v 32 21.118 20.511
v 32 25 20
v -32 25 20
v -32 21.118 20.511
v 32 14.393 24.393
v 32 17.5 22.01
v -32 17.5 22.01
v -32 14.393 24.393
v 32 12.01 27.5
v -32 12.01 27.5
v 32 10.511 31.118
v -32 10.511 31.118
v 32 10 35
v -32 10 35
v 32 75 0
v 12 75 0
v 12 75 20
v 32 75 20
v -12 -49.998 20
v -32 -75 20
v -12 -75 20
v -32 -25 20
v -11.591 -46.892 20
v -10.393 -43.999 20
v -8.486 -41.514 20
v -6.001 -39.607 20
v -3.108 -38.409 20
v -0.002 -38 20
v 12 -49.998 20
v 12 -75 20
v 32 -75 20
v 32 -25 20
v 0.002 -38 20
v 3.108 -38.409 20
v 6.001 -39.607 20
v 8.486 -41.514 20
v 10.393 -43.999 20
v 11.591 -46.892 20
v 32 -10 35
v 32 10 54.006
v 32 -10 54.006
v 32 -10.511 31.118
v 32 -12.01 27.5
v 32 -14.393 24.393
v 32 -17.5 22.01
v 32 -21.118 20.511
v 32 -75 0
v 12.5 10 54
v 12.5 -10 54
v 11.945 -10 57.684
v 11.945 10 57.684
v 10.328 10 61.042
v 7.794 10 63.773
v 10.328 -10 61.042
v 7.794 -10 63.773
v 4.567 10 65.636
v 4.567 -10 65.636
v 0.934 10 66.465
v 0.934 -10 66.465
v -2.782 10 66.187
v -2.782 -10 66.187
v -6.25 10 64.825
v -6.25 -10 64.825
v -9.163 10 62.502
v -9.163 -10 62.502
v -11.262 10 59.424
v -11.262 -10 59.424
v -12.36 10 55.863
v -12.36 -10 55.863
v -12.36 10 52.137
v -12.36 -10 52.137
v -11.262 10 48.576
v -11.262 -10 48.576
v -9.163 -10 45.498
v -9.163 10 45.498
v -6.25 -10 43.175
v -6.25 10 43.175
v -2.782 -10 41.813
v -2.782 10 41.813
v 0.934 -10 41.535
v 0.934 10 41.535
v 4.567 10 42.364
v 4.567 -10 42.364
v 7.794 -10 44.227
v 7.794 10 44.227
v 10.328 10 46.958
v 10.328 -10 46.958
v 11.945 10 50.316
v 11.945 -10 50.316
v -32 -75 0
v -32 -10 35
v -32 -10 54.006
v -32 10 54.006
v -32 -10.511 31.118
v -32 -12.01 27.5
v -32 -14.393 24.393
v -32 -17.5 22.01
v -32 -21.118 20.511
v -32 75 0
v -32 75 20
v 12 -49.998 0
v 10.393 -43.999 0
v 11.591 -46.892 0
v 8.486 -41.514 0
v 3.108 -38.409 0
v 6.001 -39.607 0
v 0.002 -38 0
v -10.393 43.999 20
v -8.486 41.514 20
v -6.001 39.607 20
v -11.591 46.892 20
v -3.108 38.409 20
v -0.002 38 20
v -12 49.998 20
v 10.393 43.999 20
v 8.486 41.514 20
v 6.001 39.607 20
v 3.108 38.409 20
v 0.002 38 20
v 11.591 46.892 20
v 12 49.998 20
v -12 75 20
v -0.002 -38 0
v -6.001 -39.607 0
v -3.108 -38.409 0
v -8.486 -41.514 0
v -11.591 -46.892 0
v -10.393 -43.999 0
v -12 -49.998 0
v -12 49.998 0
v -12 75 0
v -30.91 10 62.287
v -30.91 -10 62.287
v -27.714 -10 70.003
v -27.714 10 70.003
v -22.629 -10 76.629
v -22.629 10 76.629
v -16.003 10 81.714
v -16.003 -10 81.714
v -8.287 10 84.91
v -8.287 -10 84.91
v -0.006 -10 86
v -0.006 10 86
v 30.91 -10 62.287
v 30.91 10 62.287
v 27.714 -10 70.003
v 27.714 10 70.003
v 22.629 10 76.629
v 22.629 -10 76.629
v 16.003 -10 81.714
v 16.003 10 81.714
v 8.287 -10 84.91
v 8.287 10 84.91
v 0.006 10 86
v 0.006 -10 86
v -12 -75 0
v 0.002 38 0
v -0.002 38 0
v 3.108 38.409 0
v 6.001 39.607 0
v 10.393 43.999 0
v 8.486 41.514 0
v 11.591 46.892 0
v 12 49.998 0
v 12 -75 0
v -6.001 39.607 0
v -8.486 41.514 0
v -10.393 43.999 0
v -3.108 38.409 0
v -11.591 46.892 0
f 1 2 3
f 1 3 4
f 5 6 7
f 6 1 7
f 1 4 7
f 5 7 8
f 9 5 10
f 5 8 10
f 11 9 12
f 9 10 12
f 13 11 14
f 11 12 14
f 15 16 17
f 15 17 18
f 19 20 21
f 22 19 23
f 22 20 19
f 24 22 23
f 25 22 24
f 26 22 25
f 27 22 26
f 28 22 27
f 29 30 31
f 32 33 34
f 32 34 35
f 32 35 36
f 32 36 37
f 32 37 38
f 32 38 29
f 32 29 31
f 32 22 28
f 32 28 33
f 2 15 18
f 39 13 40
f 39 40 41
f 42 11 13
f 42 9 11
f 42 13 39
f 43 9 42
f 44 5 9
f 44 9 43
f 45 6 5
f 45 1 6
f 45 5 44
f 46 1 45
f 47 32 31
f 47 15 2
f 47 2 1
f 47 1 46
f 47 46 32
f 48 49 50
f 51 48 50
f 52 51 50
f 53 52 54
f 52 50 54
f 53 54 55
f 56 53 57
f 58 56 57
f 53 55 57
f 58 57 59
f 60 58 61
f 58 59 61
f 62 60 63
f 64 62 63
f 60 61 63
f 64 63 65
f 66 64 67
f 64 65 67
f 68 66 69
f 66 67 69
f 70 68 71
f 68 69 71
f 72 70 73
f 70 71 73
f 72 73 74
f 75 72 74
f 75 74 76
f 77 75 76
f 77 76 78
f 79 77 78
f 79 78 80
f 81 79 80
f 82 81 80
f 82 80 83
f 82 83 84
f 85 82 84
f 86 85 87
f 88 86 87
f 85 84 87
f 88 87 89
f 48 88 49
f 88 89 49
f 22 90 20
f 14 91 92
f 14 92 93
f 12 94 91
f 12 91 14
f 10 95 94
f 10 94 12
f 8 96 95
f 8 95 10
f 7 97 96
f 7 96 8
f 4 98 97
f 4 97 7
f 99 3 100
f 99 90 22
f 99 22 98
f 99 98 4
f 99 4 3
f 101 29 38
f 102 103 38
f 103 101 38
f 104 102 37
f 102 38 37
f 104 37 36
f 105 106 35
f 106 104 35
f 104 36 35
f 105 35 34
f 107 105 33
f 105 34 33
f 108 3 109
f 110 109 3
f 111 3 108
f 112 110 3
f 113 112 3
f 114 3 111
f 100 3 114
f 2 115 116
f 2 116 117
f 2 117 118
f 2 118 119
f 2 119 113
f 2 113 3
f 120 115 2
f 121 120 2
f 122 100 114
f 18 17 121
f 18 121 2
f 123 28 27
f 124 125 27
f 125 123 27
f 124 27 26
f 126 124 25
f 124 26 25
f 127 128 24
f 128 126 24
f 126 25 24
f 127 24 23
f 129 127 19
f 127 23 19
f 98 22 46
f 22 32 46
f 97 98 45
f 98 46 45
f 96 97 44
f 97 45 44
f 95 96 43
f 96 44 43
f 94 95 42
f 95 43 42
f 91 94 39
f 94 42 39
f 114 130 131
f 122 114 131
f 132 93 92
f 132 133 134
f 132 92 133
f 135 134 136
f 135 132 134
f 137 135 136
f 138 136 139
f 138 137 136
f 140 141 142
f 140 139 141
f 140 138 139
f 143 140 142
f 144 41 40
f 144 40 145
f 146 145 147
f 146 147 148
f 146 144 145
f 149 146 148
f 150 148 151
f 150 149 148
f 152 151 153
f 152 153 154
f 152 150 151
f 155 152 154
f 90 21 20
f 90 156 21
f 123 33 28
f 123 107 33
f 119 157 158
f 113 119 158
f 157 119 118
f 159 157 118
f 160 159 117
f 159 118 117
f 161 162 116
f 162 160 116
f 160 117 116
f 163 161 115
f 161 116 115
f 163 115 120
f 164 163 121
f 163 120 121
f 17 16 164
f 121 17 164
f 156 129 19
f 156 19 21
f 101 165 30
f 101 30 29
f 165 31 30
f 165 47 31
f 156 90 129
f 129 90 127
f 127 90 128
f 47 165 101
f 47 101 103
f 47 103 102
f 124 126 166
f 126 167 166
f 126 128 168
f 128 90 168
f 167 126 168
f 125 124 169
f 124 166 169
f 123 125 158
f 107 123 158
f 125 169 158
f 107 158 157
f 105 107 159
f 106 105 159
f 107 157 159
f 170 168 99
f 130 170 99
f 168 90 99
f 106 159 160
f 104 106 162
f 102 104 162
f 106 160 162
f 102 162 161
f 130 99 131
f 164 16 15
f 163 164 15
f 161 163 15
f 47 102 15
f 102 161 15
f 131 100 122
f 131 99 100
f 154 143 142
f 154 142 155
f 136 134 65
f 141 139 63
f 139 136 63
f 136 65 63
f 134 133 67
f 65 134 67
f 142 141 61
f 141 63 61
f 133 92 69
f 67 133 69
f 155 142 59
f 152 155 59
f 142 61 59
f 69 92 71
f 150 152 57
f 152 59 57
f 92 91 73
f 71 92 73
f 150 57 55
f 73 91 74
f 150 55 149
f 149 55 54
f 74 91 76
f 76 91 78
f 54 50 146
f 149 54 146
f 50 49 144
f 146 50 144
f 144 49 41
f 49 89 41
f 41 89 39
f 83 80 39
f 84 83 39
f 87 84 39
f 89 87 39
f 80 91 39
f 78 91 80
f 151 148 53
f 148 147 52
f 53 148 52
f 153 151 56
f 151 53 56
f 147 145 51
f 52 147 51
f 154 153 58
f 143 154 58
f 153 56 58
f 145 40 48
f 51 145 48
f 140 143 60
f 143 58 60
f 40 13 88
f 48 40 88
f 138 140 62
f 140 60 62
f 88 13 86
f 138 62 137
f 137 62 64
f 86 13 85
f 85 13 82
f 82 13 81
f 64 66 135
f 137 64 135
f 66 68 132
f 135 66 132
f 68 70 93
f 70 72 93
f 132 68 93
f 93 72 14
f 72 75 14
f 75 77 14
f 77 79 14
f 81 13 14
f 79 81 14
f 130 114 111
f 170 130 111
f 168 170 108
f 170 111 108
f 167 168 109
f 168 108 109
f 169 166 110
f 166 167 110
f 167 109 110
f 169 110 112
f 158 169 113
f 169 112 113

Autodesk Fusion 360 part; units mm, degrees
sketch "Sketch1" plane through (0, 0, 0) normal (0, 0, 1) x (1, 0, 0)
  line L0 (-32, 75) -> (32, 75)
  line L1 (32, 75) -> (32, -75)
  line L2 (32, -75) -> (-32, -75)
  line L3 (-32, -75) -> (-32, 75)
  line L4 (-32, -10) -> (32, -10)
  line L5 (32, -10) -> (32, 10)
  line L6 (32, 10) -> (-32, 10)
  line L7 (-32, 10) -> (-32, -10)
  line L8 (-12, 75) -> (12, 75)
  line L9 (12, 75) -> (12, 38)
  line L10 (12, 38) -> (-12, 38)
  line L11 (-12, 38) -> (-12, 75)
  line L12 (-32, 0) -> (32, 0)
  line L13 (-12, -38) -> (-12, -75)
  line L14 (12, -38) -> (-12, -38)
  line L15 (12, -75) -> (12, -38)
  dimension "d1" = 64
  dimension "d2" = 150
  dimension "d3" = 75
  dimension "d4" = 32
  dimension "d5" = 20
  dimension "d6" = 10
  dimension "d7" = 24
  dimension "d8" = 37
  dimension "d9" = 12
extrude "Extrude1" add sketch "Sketch1" along normal blind 20 contours L0 L1 L3 L6 L9 L10 L11 | L1 L2 L3 L4 L13 L14 L15 makes body 1 at (-4, -19.3333, 0) makes body 2 at (4, 19.3333, 0)
extrude "Extrude2" add sketch "Sketch1" along normal blind 86 contours L1 L3 L5 L6 L7 L12 | L1 L3 L4 L5 L7 L12 bodies 1 2
sketch "Sketch2" plane through (0, -10, 0) normal (0, -1, 0) x (1, 0, 0)
  line L0 (-32, 20) -> (32, 20)
  line L1 (32, 20) -> (32, 86)
  line L2 (32, 86) -> (-32, 86)
  line L3 (-32, 86) -> (-32, 20)
  circle A0 centre (0, 54) radius 12.5
  line L4 (32, 0) -> (-32, 0)
  dimension "d14" = 25
  dimension "d16" = 54
extrude "Extrude3" cut sketch "Sketch2" against normal up to surface (20 mm away) contours A0 bodies 1
fillet "Fillet1" radius 32 2 edges at (32, 0, 86) (-32, 0, 86) on bodies 1
fillet "Fillet2" radius 15 2 edges at (0, 10, 20) (0, -10, 20) on bodies 1
fillet "Fillet3" radius 12 4 edges at (-12, -38, 10) (12, -38, 10) (12, 38, 10) (-12, 38, 10) on bodies 1
equation "d1 = ( 2 * 20 ) * 1 mm + 24 mm"
equation "d2 = ( 2 * 65 ) * 1 mm + 20 mm"
equation "d3 = ( 150 / 2 ) * 1 mm"
equation "d8 = 25 mm + 12 mm"
equation "d12 = 54 mm + 32 mm"
